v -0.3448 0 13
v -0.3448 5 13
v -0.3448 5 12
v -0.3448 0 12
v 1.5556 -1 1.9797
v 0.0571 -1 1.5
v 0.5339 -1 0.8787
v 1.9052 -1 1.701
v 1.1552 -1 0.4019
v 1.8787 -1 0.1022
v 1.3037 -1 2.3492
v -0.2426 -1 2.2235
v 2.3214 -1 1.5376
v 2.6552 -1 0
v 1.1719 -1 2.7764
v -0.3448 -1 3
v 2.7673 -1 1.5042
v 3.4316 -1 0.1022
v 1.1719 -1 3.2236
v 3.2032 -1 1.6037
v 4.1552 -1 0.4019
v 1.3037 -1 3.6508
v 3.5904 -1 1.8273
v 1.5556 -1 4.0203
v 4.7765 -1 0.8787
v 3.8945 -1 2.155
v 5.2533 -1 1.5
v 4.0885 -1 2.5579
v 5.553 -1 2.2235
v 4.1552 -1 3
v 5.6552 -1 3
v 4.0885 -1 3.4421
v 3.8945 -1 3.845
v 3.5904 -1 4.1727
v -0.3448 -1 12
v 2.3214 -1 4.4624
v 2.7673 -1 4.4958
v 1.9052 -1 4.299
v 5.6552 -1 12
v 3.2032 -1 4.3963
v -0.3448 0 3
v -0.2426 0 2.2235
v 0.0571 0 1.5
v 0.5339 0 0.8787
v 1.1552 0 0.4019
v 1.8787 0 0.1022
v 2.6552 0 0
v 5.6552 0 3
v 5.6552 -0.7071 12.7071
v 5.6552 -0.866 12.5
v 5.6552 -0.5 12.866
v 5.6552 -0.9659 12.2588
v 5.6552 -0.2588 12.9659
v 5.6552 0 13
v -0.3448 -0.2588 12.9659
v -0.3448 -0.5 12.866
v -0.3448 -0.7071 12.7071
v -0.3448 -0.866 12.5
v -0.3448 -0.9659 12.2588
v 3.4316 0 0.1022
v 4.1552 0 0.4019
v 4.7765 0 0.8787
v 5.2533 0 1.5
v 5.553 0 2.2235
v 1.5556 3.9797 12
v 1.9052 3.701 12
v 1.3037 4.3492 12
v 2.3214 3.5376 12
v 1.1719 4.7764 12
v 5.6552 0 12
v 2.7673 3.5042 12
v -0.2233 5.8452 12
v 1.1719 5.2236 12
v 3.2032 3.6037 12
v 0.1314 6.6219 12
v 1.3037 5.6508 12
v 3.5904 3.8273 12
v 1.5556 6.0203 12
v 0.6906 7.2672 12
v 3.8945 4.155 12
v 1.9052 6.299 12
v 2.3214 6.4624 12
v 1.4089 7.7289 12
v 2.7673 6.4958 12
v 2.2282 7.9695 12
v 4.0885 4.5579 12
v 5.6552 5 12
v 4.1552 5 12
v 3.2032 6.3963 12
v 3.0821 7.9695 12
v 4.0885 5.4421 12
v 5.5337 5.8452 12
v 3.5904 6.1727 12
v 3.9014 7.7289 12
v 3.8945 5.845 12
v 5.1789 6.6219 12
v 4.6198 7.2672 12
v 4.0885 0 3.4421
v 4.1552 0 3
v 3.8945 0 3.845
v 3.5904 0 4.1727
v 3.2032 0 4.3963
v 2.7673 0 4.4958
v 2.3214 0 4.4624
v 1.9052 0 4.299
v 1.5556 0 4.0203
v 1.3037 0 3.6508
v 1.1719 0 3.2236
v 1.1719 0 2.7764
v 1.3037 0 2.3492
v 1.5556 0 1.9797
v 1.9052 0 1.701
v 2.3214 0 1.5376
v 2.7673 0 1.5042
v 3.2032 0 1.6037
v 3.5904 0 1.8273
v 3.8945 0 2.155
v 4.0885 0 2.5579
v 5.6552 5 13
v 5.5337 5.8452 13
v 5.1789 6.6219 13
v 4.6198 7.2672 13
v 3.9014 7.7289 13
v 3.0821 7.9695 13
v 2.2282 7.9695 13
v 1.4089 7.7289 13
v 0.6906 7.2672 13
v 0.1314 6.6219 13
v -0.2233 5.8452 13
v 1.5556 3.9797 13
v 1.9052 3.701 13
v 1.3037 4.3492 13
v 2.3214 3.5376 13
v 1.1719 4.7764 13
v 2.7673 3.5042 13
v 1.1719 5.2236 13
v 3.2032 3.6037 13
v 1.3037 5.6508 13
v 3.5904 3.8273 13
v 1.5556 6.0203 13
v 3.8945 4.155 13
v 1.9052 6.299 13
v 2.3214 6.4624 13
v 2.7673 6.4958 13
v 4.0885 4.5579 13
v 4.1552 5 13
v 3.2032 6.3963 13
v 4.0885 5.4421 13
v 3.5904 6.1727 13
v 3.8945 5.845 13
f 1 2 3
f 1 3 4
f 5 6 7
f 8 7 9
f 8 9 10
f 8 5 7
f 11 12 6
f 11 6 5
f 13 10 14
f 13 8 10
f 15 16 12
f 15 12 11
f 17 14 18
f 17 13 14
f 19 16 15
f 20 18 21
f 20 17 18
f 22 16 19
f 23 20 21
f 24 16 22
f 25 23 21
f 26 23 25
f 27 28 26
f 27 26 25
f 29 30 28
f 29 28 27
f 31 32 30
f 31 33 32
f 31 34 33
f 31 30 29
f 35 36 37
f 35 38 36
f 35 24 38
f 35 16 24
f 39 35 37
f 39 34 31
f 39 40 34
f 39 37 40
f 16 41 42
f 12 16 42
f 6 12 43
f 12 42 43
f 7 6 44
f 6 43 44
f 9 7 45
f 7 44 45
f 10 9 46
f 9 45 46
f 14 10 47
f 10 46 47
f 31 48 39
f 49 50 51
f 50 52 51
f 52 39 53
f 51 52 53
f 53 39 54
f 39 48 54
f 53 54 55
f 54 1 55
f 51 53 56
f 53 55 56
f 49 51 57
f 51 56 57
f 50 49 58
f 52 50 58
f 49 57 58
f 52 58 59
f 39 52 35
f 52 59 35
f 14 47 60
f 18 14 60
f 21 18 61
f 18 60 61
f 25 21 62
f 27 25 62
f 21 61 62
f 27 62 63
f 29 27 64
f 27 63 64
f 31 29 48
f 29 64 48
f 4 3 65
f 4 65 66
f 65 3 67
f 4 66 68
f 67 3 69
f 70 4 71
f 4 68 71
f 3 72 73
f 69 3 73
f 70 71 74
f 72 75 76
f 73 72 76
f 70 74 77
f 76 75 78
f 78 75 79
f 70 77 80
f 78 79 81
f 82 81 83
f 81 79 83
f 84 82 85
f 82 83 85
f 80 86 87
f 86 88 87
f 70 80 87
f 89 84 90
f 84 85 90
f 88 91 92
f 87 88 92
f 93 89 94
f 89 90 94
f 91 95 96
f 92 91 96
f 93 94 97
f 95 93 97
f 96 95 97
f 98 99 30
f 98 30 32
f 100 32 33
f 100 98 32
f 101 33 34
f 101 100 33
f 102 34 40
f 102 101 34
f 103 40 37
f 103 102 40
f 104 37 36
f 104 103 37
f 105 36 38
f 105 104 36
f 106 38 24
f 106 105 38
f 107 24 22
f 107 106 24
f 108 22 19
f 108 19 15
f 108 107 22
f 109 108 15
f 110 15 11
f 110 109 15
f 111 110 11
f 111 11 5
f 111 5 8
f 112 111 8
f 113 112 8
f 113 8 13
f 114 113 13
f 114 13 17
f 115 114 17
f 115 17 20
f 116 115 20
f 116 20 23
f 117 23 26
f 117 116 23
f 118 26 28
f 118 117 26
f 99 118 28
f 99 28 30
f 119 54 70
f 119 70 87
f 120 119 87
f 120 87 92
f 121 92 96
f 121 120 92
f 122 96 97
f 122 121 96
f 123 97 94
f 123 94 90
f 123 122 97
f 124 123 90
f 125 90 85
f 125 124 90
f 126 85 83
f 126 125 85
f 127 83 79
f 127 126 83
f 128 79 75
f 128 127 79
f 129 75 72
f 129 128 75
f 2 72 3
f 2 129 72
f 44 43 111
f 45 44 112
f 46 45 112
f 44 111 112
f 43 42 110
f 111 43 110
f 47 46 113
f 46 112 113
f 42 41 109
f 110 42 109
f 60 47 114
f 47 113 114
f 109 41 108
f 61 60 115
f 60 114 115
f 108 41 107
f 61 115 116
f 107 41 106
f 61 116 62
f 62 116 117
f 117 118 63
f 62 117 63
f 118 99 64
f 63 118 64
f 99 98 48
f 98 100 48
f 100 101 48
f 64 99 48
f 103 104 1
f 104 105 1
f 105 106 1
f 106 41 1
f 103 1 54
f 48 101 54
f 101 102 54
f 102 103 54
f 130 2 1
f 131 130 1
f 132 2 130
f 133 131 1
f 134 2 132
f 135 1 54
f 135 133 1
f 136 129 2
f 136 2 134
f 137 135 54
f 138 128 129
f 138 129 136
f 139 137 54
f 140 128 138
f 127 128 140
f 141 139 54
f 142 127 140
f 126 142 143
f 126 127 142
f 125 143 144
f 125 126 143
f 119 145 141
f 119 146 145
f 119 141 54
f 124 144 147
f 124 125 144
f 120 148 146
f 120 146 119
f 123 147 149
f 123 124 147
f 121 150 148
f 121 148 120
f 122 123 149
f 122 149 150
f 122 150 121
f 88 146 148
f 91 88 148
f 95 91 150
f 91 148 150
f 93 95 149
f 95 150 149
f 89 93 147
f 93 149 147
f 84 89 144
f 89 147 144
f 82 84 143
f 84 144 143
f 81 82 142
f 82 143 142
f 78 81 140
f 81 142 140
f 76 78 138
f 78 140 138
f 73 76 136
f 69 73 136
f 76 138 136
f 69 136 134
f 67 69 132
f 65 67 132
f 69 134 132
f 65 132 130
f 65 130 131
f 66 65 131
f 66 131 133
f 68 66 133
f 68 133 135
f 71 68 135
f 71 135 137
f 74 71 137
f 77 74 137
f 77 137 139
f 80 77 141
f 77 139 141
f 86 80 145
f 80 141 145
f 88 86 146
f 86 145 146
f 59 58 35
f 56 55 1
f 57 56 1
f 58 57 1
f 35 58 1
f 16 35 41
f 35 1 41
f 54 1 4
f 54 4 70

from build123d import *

# Parameters (mm, degrees)
F0_R     = 1.5
F1_DEPTH = 1
F2_R     = 1.5
F3_DEPTH = 1
F4_R     = 0.99999


# Not quite as in the source:
# - a fillet or chamfer is up to 0.001 mm smaller than in the source, because OpenCascade refuses the exact size


with BuildPart() as f1:
    # F0 (on Front) → F1 (new body)
    with BuildSketch(Plane.XZ):
        with BuildLine():
            Line((-0.3448204223, 13), (-0.3448204223, 3))
            ThreePointArc((-0.3448204223, 3), (0.5338592341, 0.8786796564), (2.6551795777, 0))
            ThreePointArc((2.6551795777, 0), (4.7764999212, 0.8786796564), (5.6551795777, 3))
            Line((5.6551795777, 3), (5.6551795777, 13))
            Line((5.6551795777, 13), (-0.3448204223, 13))
        make_face()
        with Locations((2.6551795777, 3)):
            Circle(F0_R, mode=Mode.SUBTRACT)
    extrude(amount=F1_DEPTH)

    # F4 (radius 1 in the source; OpenCascade refuses exactly that, so slightly less here)
    f4_edges = [f1.edges().sort_by_distance(p)[0] for p in [
        (2.65518, -1, 13),
    ]]
    fillet(f4_edges, radius=F4_R)


with BuildPart() as f3:
    # F2 (on face) → F3 (new body)
    with BuildSketch(Plane.XY.offset(13)):
        with BuildLine():
            Line((-0.3448204223, 5), (-0.3448204223, 0))
            Line((-0.3448204223, 0), (5.6551795777, 0))
            Line((5.6551795777, 0), (5.6551795777, 5))
            ThreePointArc((5.6551795777, 5), (2.6551795777, 8), (-0.3448204223, 5))
        make_face()
        with Locations((2.6551795777, 5)):
            Circle(F2_R, mode=Mode.SUBTRACT)
    extrude(amount=-F3_DEPTH)


solid = Compound([f1.part, f3.part])
